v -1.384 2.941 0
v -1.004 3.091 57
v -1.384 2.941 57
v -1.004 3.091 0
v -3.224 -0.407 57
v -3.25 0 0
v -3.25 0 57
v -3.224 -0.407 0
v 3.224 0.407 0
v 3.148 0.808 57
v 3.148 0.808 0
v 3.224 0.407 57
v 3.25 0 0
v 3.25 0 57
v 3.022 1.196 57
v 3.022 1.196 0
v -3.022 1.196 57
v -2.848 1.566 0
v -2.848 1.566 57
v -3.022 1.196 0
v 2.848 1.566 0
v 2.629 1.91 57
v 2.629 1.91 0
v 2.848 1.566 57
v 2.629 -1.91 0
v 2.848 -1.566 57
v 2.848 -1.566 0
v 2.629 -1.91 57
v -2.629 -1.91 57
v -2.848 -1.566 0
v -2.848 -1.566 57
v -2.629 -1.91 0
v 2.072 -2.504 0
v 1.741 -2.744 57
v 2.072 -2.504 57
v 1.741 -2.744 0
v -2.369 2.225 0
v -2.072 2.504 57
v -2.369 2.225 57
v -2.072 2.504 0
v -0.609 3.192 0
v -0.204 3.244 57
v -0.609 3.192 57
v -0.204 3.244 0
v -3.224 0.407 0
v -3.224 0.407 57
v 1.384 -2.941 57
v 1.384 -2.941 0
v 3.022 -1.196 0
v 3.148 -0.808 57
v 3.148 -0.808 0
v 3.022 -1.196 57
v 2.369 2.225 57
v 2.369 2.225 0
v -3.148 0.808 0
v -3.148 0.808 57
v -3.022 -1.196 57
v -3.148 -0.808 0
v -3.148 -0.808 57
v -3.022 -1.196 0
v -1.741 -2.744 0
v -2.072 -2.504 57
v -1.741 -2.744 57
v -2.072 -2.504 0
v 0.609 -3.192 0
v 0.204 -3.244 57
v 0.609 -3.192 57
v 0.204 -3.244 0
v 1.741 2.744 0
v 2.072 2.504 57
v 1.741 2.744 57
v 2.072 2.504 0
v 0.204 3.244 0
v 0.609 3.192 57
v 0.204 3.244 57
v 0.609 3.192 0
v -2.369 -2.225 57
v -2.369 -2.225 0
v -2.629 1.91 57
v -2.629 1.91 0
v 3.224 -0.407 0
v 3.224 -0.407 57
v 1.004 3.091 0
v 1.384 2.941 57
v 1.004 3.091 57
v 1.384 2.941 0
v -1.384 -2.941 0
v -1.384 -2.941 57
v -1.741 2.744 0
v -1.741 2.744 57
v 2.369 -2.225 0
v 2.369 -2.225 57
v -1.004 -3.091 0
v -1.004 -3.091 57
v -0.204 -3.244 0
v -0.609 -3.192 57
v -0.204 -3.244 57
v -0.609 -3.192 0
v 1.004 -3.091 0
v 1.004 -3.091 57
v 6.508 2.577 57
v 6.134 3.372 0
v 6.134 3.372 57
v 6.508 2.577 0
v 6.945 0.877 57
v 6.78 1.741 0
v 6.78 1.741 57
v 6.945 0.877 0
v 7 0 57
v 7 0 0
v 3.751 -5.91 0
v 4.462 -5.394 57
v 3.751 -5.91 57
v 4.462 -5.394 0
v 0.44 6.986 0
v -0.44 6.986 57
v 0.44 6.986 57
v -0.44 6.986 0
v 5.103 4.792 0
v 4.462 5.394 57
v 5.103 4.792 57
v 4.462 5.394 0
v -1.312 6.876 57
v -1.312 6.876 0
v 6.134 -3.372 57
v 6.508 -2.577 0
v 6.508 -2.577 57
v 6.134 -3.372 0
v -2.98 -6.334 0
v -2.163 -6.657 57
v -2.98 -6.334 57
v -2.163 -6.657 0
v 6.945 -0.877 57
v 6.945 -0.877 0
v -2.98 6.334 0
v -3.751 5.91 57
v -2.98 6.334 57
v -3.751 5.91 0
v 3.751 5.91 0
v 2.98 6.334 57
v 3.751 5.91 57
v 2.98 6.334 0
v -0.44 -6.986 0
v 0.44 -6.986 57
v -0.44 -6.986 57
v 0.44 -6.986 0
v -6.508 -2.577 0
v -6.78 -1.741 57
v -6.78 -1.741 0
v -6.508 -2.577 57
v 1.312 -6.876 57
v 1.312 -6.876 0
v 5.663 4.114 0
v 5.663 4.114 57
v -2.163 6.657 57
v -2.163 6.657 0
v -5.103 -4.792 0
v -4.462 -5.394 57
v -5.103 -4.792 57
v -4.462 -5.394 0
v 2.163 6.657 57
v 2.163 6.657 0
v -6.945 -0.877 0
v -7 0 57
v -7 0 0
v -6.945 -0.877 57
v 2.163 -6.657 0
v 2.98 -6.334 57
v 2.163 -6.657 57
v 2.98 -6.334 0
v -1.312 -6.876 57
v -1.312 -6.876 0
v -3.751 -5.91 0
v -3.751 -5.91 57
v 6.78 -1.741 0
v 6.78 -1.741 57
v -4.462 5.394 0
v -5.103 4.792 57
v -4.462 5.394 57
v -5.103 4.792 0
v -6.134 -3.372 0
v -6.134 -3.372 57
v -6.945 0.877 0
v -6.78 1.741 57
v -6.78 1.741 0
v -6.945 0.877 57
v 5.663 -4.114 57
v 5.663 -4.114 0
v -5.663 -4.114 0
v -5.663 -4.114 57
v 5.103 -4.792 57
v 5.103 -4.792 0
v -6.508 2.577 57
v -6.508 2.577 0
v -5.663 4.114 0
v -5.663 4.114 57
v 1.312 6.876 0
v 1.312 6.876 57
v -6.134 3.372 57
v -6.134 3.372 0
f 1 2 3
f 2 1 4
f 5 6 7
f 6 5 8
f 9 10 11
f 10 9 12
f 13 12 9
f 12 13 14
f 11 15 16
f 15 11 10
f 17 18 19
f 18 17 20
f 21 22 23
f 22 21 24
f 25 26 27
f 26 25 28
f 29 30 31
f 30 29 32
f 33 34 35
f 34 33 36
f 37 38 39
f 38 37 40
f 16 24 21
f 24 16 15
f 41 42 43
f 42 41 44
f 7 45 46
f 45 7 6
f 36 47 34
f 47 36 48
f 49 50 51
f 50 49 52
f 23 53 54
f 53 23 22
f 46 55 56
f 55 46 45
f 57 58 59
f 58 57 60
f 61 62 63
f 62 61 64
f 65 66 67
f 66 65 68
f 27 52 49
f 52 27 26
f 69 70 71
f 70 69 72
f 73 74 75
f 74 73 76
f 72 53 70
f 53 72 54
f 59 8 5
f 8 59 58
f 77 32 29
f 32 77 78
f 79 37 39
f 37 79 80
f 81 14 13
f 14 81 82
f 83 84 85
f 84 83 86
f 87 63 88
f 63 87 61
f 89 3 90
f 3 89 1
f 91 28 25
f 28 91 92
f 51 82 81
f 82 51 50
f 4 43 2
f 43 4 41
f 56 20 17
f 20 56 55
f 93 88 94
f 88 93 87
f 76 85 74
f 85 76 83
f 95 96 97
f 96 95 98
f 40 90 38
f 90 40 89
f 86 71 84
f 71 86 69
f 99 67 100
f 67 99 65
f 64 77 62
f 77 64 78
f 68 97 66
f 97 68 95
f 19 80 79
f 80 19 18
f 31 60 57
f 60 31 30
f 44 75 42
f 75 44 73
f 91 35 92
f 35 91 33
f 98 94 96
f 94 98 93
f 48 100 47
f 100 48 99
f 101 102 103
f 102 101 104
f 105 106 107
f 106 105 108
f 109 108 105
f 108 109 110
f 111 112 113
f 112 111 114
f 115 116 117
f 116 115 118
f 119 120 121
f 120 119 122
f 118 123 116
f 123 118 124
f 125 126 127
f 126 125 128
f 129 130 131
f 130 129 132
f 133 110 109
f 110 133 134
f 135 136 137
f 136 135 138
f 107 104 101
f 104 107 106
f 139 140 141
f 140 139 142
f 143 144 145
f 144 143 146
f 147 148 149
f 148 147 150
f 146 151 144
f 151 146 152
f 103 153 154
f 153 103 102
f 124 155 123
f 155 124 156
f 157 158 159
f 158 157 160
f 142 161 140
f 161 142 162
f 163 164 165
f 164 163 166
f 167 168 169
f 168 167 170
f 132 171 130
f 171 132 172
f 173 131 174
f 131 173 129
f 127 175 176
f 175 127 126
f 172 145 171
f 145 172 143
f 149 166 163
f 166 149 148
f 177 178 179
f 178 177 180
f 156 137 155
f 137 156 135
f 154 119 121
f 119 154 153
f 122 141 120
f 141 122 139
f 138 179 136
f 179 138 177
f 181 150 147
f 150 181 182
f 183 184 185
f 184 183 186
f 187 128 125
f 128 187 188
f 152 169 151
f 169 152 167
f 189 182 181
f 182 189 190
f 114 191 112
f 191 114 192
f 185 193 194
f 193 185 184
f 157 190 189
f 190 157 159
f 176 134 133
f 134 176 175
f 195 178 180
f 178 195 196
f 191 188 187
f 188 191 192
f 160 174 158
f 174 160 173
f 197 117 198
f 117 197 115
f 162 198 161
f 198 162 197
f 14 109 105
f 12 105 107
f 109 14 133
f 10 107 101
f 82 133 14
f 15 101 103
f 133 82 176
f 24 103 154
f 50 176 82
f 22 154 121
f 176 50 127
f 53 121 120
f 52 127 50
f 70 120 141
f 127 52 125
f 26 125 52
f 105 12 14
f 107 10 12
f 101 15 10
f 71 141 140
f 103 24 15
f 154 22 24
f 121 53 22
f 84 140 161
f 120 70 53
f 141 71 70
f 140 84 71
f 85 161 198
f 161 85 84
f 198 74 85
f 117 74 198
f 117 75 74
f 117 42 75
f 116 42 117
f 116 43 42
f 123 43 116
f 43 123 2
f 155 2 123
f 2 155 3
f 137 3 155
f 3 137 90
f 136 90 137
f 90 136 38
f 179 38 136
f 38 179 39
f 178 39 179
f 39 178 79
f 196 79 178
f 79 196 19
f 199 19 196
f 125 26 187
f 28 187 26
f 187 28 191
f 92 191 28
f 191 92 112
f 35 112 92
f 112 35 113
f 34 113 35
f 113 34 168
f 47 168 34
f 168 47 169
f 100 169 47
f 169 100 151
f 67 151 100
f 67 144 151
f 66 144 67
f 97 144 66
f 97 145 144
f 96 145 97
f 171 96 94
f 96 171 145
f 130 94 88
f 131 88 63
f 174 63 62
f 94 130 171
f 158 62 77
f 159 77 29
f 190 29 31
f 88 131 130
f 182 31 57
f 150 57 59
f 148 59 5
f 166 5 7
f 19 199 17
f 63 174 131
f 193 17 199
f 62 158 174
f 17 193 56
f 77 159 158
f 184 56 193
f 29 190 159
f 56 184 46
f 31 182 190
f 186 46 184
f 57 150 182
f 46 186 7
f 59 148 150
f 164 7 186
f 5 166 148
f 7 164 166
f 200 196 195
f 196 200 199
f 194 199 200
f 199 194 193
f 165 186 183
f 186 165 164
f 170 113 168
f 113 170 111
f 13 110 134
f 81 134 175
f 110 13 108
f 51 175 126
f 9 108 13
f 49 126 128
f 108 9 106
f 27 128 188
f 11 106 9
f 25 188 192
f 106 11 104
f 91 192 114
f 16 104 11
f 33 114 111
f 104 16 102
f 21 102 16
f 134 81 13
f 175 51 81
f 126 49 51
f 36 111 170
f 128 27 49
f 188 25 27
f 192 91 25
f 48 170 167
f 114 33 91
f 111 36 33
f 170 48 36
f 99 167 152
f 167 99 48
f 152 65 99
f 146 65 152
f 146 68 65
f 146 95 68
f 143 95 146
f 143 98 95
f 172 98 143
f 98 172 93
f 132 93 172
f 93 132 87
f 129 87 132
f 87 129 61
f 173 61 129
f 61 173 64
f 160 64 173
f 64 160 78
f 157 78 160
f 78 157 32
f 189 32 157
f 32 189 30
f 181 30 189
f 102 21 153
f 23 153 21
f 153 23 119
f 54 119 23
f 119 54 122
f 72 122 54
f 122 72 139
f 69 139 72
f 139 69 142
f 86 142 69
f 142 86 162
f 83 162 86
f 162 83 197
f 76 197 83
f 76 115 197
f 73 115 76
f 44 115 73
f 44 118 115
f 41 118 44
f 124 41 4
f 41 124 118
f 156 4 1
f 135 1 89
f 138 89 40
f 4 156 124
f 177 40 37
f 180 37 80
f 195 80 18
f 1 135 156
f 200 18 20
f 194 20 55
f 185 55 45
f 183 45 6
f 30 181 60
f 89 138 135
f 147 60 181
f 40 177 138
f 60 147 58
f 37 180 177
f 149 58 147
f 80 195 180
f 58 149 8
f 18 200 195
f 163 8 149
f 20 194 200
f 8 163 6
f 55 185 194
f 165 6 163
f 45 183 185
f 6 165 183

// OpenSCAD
$fn = 50;


difference() {
	union() {
		*color(alpha = 1.0000000000, c = "gray") {
			translate(v = [0, 7, 0]) {
				linear_extrude(height = 1) {
					text(font = "Arial:style=Bold", halign = "center", size = 4.5000000000, text = "COMMENT plate main", valign = "center");
				}
			}
		}
		cylinder(h = 57, r = 7.0000000000);
	}
	union() {
		*color(alpha = 1.0000000000, c = "gray") {
			translate(v = [0, 7, 0]) {
				linear_extrude(height = 1) {
					text(font = "Arial:style=Bold", halign = "center", size = 4.5000000000, text = "COMMENT holes main", valign = "center");
				}
			}
		}
		translate(v = [0, 0, -100]) {
			cylinder(h = 200, r = 3.2500000000);
		}
		translate(v = [0, 0, -100]) {
			cylinder(h = 200, r = 1.8000000000);
		}
	}
}
